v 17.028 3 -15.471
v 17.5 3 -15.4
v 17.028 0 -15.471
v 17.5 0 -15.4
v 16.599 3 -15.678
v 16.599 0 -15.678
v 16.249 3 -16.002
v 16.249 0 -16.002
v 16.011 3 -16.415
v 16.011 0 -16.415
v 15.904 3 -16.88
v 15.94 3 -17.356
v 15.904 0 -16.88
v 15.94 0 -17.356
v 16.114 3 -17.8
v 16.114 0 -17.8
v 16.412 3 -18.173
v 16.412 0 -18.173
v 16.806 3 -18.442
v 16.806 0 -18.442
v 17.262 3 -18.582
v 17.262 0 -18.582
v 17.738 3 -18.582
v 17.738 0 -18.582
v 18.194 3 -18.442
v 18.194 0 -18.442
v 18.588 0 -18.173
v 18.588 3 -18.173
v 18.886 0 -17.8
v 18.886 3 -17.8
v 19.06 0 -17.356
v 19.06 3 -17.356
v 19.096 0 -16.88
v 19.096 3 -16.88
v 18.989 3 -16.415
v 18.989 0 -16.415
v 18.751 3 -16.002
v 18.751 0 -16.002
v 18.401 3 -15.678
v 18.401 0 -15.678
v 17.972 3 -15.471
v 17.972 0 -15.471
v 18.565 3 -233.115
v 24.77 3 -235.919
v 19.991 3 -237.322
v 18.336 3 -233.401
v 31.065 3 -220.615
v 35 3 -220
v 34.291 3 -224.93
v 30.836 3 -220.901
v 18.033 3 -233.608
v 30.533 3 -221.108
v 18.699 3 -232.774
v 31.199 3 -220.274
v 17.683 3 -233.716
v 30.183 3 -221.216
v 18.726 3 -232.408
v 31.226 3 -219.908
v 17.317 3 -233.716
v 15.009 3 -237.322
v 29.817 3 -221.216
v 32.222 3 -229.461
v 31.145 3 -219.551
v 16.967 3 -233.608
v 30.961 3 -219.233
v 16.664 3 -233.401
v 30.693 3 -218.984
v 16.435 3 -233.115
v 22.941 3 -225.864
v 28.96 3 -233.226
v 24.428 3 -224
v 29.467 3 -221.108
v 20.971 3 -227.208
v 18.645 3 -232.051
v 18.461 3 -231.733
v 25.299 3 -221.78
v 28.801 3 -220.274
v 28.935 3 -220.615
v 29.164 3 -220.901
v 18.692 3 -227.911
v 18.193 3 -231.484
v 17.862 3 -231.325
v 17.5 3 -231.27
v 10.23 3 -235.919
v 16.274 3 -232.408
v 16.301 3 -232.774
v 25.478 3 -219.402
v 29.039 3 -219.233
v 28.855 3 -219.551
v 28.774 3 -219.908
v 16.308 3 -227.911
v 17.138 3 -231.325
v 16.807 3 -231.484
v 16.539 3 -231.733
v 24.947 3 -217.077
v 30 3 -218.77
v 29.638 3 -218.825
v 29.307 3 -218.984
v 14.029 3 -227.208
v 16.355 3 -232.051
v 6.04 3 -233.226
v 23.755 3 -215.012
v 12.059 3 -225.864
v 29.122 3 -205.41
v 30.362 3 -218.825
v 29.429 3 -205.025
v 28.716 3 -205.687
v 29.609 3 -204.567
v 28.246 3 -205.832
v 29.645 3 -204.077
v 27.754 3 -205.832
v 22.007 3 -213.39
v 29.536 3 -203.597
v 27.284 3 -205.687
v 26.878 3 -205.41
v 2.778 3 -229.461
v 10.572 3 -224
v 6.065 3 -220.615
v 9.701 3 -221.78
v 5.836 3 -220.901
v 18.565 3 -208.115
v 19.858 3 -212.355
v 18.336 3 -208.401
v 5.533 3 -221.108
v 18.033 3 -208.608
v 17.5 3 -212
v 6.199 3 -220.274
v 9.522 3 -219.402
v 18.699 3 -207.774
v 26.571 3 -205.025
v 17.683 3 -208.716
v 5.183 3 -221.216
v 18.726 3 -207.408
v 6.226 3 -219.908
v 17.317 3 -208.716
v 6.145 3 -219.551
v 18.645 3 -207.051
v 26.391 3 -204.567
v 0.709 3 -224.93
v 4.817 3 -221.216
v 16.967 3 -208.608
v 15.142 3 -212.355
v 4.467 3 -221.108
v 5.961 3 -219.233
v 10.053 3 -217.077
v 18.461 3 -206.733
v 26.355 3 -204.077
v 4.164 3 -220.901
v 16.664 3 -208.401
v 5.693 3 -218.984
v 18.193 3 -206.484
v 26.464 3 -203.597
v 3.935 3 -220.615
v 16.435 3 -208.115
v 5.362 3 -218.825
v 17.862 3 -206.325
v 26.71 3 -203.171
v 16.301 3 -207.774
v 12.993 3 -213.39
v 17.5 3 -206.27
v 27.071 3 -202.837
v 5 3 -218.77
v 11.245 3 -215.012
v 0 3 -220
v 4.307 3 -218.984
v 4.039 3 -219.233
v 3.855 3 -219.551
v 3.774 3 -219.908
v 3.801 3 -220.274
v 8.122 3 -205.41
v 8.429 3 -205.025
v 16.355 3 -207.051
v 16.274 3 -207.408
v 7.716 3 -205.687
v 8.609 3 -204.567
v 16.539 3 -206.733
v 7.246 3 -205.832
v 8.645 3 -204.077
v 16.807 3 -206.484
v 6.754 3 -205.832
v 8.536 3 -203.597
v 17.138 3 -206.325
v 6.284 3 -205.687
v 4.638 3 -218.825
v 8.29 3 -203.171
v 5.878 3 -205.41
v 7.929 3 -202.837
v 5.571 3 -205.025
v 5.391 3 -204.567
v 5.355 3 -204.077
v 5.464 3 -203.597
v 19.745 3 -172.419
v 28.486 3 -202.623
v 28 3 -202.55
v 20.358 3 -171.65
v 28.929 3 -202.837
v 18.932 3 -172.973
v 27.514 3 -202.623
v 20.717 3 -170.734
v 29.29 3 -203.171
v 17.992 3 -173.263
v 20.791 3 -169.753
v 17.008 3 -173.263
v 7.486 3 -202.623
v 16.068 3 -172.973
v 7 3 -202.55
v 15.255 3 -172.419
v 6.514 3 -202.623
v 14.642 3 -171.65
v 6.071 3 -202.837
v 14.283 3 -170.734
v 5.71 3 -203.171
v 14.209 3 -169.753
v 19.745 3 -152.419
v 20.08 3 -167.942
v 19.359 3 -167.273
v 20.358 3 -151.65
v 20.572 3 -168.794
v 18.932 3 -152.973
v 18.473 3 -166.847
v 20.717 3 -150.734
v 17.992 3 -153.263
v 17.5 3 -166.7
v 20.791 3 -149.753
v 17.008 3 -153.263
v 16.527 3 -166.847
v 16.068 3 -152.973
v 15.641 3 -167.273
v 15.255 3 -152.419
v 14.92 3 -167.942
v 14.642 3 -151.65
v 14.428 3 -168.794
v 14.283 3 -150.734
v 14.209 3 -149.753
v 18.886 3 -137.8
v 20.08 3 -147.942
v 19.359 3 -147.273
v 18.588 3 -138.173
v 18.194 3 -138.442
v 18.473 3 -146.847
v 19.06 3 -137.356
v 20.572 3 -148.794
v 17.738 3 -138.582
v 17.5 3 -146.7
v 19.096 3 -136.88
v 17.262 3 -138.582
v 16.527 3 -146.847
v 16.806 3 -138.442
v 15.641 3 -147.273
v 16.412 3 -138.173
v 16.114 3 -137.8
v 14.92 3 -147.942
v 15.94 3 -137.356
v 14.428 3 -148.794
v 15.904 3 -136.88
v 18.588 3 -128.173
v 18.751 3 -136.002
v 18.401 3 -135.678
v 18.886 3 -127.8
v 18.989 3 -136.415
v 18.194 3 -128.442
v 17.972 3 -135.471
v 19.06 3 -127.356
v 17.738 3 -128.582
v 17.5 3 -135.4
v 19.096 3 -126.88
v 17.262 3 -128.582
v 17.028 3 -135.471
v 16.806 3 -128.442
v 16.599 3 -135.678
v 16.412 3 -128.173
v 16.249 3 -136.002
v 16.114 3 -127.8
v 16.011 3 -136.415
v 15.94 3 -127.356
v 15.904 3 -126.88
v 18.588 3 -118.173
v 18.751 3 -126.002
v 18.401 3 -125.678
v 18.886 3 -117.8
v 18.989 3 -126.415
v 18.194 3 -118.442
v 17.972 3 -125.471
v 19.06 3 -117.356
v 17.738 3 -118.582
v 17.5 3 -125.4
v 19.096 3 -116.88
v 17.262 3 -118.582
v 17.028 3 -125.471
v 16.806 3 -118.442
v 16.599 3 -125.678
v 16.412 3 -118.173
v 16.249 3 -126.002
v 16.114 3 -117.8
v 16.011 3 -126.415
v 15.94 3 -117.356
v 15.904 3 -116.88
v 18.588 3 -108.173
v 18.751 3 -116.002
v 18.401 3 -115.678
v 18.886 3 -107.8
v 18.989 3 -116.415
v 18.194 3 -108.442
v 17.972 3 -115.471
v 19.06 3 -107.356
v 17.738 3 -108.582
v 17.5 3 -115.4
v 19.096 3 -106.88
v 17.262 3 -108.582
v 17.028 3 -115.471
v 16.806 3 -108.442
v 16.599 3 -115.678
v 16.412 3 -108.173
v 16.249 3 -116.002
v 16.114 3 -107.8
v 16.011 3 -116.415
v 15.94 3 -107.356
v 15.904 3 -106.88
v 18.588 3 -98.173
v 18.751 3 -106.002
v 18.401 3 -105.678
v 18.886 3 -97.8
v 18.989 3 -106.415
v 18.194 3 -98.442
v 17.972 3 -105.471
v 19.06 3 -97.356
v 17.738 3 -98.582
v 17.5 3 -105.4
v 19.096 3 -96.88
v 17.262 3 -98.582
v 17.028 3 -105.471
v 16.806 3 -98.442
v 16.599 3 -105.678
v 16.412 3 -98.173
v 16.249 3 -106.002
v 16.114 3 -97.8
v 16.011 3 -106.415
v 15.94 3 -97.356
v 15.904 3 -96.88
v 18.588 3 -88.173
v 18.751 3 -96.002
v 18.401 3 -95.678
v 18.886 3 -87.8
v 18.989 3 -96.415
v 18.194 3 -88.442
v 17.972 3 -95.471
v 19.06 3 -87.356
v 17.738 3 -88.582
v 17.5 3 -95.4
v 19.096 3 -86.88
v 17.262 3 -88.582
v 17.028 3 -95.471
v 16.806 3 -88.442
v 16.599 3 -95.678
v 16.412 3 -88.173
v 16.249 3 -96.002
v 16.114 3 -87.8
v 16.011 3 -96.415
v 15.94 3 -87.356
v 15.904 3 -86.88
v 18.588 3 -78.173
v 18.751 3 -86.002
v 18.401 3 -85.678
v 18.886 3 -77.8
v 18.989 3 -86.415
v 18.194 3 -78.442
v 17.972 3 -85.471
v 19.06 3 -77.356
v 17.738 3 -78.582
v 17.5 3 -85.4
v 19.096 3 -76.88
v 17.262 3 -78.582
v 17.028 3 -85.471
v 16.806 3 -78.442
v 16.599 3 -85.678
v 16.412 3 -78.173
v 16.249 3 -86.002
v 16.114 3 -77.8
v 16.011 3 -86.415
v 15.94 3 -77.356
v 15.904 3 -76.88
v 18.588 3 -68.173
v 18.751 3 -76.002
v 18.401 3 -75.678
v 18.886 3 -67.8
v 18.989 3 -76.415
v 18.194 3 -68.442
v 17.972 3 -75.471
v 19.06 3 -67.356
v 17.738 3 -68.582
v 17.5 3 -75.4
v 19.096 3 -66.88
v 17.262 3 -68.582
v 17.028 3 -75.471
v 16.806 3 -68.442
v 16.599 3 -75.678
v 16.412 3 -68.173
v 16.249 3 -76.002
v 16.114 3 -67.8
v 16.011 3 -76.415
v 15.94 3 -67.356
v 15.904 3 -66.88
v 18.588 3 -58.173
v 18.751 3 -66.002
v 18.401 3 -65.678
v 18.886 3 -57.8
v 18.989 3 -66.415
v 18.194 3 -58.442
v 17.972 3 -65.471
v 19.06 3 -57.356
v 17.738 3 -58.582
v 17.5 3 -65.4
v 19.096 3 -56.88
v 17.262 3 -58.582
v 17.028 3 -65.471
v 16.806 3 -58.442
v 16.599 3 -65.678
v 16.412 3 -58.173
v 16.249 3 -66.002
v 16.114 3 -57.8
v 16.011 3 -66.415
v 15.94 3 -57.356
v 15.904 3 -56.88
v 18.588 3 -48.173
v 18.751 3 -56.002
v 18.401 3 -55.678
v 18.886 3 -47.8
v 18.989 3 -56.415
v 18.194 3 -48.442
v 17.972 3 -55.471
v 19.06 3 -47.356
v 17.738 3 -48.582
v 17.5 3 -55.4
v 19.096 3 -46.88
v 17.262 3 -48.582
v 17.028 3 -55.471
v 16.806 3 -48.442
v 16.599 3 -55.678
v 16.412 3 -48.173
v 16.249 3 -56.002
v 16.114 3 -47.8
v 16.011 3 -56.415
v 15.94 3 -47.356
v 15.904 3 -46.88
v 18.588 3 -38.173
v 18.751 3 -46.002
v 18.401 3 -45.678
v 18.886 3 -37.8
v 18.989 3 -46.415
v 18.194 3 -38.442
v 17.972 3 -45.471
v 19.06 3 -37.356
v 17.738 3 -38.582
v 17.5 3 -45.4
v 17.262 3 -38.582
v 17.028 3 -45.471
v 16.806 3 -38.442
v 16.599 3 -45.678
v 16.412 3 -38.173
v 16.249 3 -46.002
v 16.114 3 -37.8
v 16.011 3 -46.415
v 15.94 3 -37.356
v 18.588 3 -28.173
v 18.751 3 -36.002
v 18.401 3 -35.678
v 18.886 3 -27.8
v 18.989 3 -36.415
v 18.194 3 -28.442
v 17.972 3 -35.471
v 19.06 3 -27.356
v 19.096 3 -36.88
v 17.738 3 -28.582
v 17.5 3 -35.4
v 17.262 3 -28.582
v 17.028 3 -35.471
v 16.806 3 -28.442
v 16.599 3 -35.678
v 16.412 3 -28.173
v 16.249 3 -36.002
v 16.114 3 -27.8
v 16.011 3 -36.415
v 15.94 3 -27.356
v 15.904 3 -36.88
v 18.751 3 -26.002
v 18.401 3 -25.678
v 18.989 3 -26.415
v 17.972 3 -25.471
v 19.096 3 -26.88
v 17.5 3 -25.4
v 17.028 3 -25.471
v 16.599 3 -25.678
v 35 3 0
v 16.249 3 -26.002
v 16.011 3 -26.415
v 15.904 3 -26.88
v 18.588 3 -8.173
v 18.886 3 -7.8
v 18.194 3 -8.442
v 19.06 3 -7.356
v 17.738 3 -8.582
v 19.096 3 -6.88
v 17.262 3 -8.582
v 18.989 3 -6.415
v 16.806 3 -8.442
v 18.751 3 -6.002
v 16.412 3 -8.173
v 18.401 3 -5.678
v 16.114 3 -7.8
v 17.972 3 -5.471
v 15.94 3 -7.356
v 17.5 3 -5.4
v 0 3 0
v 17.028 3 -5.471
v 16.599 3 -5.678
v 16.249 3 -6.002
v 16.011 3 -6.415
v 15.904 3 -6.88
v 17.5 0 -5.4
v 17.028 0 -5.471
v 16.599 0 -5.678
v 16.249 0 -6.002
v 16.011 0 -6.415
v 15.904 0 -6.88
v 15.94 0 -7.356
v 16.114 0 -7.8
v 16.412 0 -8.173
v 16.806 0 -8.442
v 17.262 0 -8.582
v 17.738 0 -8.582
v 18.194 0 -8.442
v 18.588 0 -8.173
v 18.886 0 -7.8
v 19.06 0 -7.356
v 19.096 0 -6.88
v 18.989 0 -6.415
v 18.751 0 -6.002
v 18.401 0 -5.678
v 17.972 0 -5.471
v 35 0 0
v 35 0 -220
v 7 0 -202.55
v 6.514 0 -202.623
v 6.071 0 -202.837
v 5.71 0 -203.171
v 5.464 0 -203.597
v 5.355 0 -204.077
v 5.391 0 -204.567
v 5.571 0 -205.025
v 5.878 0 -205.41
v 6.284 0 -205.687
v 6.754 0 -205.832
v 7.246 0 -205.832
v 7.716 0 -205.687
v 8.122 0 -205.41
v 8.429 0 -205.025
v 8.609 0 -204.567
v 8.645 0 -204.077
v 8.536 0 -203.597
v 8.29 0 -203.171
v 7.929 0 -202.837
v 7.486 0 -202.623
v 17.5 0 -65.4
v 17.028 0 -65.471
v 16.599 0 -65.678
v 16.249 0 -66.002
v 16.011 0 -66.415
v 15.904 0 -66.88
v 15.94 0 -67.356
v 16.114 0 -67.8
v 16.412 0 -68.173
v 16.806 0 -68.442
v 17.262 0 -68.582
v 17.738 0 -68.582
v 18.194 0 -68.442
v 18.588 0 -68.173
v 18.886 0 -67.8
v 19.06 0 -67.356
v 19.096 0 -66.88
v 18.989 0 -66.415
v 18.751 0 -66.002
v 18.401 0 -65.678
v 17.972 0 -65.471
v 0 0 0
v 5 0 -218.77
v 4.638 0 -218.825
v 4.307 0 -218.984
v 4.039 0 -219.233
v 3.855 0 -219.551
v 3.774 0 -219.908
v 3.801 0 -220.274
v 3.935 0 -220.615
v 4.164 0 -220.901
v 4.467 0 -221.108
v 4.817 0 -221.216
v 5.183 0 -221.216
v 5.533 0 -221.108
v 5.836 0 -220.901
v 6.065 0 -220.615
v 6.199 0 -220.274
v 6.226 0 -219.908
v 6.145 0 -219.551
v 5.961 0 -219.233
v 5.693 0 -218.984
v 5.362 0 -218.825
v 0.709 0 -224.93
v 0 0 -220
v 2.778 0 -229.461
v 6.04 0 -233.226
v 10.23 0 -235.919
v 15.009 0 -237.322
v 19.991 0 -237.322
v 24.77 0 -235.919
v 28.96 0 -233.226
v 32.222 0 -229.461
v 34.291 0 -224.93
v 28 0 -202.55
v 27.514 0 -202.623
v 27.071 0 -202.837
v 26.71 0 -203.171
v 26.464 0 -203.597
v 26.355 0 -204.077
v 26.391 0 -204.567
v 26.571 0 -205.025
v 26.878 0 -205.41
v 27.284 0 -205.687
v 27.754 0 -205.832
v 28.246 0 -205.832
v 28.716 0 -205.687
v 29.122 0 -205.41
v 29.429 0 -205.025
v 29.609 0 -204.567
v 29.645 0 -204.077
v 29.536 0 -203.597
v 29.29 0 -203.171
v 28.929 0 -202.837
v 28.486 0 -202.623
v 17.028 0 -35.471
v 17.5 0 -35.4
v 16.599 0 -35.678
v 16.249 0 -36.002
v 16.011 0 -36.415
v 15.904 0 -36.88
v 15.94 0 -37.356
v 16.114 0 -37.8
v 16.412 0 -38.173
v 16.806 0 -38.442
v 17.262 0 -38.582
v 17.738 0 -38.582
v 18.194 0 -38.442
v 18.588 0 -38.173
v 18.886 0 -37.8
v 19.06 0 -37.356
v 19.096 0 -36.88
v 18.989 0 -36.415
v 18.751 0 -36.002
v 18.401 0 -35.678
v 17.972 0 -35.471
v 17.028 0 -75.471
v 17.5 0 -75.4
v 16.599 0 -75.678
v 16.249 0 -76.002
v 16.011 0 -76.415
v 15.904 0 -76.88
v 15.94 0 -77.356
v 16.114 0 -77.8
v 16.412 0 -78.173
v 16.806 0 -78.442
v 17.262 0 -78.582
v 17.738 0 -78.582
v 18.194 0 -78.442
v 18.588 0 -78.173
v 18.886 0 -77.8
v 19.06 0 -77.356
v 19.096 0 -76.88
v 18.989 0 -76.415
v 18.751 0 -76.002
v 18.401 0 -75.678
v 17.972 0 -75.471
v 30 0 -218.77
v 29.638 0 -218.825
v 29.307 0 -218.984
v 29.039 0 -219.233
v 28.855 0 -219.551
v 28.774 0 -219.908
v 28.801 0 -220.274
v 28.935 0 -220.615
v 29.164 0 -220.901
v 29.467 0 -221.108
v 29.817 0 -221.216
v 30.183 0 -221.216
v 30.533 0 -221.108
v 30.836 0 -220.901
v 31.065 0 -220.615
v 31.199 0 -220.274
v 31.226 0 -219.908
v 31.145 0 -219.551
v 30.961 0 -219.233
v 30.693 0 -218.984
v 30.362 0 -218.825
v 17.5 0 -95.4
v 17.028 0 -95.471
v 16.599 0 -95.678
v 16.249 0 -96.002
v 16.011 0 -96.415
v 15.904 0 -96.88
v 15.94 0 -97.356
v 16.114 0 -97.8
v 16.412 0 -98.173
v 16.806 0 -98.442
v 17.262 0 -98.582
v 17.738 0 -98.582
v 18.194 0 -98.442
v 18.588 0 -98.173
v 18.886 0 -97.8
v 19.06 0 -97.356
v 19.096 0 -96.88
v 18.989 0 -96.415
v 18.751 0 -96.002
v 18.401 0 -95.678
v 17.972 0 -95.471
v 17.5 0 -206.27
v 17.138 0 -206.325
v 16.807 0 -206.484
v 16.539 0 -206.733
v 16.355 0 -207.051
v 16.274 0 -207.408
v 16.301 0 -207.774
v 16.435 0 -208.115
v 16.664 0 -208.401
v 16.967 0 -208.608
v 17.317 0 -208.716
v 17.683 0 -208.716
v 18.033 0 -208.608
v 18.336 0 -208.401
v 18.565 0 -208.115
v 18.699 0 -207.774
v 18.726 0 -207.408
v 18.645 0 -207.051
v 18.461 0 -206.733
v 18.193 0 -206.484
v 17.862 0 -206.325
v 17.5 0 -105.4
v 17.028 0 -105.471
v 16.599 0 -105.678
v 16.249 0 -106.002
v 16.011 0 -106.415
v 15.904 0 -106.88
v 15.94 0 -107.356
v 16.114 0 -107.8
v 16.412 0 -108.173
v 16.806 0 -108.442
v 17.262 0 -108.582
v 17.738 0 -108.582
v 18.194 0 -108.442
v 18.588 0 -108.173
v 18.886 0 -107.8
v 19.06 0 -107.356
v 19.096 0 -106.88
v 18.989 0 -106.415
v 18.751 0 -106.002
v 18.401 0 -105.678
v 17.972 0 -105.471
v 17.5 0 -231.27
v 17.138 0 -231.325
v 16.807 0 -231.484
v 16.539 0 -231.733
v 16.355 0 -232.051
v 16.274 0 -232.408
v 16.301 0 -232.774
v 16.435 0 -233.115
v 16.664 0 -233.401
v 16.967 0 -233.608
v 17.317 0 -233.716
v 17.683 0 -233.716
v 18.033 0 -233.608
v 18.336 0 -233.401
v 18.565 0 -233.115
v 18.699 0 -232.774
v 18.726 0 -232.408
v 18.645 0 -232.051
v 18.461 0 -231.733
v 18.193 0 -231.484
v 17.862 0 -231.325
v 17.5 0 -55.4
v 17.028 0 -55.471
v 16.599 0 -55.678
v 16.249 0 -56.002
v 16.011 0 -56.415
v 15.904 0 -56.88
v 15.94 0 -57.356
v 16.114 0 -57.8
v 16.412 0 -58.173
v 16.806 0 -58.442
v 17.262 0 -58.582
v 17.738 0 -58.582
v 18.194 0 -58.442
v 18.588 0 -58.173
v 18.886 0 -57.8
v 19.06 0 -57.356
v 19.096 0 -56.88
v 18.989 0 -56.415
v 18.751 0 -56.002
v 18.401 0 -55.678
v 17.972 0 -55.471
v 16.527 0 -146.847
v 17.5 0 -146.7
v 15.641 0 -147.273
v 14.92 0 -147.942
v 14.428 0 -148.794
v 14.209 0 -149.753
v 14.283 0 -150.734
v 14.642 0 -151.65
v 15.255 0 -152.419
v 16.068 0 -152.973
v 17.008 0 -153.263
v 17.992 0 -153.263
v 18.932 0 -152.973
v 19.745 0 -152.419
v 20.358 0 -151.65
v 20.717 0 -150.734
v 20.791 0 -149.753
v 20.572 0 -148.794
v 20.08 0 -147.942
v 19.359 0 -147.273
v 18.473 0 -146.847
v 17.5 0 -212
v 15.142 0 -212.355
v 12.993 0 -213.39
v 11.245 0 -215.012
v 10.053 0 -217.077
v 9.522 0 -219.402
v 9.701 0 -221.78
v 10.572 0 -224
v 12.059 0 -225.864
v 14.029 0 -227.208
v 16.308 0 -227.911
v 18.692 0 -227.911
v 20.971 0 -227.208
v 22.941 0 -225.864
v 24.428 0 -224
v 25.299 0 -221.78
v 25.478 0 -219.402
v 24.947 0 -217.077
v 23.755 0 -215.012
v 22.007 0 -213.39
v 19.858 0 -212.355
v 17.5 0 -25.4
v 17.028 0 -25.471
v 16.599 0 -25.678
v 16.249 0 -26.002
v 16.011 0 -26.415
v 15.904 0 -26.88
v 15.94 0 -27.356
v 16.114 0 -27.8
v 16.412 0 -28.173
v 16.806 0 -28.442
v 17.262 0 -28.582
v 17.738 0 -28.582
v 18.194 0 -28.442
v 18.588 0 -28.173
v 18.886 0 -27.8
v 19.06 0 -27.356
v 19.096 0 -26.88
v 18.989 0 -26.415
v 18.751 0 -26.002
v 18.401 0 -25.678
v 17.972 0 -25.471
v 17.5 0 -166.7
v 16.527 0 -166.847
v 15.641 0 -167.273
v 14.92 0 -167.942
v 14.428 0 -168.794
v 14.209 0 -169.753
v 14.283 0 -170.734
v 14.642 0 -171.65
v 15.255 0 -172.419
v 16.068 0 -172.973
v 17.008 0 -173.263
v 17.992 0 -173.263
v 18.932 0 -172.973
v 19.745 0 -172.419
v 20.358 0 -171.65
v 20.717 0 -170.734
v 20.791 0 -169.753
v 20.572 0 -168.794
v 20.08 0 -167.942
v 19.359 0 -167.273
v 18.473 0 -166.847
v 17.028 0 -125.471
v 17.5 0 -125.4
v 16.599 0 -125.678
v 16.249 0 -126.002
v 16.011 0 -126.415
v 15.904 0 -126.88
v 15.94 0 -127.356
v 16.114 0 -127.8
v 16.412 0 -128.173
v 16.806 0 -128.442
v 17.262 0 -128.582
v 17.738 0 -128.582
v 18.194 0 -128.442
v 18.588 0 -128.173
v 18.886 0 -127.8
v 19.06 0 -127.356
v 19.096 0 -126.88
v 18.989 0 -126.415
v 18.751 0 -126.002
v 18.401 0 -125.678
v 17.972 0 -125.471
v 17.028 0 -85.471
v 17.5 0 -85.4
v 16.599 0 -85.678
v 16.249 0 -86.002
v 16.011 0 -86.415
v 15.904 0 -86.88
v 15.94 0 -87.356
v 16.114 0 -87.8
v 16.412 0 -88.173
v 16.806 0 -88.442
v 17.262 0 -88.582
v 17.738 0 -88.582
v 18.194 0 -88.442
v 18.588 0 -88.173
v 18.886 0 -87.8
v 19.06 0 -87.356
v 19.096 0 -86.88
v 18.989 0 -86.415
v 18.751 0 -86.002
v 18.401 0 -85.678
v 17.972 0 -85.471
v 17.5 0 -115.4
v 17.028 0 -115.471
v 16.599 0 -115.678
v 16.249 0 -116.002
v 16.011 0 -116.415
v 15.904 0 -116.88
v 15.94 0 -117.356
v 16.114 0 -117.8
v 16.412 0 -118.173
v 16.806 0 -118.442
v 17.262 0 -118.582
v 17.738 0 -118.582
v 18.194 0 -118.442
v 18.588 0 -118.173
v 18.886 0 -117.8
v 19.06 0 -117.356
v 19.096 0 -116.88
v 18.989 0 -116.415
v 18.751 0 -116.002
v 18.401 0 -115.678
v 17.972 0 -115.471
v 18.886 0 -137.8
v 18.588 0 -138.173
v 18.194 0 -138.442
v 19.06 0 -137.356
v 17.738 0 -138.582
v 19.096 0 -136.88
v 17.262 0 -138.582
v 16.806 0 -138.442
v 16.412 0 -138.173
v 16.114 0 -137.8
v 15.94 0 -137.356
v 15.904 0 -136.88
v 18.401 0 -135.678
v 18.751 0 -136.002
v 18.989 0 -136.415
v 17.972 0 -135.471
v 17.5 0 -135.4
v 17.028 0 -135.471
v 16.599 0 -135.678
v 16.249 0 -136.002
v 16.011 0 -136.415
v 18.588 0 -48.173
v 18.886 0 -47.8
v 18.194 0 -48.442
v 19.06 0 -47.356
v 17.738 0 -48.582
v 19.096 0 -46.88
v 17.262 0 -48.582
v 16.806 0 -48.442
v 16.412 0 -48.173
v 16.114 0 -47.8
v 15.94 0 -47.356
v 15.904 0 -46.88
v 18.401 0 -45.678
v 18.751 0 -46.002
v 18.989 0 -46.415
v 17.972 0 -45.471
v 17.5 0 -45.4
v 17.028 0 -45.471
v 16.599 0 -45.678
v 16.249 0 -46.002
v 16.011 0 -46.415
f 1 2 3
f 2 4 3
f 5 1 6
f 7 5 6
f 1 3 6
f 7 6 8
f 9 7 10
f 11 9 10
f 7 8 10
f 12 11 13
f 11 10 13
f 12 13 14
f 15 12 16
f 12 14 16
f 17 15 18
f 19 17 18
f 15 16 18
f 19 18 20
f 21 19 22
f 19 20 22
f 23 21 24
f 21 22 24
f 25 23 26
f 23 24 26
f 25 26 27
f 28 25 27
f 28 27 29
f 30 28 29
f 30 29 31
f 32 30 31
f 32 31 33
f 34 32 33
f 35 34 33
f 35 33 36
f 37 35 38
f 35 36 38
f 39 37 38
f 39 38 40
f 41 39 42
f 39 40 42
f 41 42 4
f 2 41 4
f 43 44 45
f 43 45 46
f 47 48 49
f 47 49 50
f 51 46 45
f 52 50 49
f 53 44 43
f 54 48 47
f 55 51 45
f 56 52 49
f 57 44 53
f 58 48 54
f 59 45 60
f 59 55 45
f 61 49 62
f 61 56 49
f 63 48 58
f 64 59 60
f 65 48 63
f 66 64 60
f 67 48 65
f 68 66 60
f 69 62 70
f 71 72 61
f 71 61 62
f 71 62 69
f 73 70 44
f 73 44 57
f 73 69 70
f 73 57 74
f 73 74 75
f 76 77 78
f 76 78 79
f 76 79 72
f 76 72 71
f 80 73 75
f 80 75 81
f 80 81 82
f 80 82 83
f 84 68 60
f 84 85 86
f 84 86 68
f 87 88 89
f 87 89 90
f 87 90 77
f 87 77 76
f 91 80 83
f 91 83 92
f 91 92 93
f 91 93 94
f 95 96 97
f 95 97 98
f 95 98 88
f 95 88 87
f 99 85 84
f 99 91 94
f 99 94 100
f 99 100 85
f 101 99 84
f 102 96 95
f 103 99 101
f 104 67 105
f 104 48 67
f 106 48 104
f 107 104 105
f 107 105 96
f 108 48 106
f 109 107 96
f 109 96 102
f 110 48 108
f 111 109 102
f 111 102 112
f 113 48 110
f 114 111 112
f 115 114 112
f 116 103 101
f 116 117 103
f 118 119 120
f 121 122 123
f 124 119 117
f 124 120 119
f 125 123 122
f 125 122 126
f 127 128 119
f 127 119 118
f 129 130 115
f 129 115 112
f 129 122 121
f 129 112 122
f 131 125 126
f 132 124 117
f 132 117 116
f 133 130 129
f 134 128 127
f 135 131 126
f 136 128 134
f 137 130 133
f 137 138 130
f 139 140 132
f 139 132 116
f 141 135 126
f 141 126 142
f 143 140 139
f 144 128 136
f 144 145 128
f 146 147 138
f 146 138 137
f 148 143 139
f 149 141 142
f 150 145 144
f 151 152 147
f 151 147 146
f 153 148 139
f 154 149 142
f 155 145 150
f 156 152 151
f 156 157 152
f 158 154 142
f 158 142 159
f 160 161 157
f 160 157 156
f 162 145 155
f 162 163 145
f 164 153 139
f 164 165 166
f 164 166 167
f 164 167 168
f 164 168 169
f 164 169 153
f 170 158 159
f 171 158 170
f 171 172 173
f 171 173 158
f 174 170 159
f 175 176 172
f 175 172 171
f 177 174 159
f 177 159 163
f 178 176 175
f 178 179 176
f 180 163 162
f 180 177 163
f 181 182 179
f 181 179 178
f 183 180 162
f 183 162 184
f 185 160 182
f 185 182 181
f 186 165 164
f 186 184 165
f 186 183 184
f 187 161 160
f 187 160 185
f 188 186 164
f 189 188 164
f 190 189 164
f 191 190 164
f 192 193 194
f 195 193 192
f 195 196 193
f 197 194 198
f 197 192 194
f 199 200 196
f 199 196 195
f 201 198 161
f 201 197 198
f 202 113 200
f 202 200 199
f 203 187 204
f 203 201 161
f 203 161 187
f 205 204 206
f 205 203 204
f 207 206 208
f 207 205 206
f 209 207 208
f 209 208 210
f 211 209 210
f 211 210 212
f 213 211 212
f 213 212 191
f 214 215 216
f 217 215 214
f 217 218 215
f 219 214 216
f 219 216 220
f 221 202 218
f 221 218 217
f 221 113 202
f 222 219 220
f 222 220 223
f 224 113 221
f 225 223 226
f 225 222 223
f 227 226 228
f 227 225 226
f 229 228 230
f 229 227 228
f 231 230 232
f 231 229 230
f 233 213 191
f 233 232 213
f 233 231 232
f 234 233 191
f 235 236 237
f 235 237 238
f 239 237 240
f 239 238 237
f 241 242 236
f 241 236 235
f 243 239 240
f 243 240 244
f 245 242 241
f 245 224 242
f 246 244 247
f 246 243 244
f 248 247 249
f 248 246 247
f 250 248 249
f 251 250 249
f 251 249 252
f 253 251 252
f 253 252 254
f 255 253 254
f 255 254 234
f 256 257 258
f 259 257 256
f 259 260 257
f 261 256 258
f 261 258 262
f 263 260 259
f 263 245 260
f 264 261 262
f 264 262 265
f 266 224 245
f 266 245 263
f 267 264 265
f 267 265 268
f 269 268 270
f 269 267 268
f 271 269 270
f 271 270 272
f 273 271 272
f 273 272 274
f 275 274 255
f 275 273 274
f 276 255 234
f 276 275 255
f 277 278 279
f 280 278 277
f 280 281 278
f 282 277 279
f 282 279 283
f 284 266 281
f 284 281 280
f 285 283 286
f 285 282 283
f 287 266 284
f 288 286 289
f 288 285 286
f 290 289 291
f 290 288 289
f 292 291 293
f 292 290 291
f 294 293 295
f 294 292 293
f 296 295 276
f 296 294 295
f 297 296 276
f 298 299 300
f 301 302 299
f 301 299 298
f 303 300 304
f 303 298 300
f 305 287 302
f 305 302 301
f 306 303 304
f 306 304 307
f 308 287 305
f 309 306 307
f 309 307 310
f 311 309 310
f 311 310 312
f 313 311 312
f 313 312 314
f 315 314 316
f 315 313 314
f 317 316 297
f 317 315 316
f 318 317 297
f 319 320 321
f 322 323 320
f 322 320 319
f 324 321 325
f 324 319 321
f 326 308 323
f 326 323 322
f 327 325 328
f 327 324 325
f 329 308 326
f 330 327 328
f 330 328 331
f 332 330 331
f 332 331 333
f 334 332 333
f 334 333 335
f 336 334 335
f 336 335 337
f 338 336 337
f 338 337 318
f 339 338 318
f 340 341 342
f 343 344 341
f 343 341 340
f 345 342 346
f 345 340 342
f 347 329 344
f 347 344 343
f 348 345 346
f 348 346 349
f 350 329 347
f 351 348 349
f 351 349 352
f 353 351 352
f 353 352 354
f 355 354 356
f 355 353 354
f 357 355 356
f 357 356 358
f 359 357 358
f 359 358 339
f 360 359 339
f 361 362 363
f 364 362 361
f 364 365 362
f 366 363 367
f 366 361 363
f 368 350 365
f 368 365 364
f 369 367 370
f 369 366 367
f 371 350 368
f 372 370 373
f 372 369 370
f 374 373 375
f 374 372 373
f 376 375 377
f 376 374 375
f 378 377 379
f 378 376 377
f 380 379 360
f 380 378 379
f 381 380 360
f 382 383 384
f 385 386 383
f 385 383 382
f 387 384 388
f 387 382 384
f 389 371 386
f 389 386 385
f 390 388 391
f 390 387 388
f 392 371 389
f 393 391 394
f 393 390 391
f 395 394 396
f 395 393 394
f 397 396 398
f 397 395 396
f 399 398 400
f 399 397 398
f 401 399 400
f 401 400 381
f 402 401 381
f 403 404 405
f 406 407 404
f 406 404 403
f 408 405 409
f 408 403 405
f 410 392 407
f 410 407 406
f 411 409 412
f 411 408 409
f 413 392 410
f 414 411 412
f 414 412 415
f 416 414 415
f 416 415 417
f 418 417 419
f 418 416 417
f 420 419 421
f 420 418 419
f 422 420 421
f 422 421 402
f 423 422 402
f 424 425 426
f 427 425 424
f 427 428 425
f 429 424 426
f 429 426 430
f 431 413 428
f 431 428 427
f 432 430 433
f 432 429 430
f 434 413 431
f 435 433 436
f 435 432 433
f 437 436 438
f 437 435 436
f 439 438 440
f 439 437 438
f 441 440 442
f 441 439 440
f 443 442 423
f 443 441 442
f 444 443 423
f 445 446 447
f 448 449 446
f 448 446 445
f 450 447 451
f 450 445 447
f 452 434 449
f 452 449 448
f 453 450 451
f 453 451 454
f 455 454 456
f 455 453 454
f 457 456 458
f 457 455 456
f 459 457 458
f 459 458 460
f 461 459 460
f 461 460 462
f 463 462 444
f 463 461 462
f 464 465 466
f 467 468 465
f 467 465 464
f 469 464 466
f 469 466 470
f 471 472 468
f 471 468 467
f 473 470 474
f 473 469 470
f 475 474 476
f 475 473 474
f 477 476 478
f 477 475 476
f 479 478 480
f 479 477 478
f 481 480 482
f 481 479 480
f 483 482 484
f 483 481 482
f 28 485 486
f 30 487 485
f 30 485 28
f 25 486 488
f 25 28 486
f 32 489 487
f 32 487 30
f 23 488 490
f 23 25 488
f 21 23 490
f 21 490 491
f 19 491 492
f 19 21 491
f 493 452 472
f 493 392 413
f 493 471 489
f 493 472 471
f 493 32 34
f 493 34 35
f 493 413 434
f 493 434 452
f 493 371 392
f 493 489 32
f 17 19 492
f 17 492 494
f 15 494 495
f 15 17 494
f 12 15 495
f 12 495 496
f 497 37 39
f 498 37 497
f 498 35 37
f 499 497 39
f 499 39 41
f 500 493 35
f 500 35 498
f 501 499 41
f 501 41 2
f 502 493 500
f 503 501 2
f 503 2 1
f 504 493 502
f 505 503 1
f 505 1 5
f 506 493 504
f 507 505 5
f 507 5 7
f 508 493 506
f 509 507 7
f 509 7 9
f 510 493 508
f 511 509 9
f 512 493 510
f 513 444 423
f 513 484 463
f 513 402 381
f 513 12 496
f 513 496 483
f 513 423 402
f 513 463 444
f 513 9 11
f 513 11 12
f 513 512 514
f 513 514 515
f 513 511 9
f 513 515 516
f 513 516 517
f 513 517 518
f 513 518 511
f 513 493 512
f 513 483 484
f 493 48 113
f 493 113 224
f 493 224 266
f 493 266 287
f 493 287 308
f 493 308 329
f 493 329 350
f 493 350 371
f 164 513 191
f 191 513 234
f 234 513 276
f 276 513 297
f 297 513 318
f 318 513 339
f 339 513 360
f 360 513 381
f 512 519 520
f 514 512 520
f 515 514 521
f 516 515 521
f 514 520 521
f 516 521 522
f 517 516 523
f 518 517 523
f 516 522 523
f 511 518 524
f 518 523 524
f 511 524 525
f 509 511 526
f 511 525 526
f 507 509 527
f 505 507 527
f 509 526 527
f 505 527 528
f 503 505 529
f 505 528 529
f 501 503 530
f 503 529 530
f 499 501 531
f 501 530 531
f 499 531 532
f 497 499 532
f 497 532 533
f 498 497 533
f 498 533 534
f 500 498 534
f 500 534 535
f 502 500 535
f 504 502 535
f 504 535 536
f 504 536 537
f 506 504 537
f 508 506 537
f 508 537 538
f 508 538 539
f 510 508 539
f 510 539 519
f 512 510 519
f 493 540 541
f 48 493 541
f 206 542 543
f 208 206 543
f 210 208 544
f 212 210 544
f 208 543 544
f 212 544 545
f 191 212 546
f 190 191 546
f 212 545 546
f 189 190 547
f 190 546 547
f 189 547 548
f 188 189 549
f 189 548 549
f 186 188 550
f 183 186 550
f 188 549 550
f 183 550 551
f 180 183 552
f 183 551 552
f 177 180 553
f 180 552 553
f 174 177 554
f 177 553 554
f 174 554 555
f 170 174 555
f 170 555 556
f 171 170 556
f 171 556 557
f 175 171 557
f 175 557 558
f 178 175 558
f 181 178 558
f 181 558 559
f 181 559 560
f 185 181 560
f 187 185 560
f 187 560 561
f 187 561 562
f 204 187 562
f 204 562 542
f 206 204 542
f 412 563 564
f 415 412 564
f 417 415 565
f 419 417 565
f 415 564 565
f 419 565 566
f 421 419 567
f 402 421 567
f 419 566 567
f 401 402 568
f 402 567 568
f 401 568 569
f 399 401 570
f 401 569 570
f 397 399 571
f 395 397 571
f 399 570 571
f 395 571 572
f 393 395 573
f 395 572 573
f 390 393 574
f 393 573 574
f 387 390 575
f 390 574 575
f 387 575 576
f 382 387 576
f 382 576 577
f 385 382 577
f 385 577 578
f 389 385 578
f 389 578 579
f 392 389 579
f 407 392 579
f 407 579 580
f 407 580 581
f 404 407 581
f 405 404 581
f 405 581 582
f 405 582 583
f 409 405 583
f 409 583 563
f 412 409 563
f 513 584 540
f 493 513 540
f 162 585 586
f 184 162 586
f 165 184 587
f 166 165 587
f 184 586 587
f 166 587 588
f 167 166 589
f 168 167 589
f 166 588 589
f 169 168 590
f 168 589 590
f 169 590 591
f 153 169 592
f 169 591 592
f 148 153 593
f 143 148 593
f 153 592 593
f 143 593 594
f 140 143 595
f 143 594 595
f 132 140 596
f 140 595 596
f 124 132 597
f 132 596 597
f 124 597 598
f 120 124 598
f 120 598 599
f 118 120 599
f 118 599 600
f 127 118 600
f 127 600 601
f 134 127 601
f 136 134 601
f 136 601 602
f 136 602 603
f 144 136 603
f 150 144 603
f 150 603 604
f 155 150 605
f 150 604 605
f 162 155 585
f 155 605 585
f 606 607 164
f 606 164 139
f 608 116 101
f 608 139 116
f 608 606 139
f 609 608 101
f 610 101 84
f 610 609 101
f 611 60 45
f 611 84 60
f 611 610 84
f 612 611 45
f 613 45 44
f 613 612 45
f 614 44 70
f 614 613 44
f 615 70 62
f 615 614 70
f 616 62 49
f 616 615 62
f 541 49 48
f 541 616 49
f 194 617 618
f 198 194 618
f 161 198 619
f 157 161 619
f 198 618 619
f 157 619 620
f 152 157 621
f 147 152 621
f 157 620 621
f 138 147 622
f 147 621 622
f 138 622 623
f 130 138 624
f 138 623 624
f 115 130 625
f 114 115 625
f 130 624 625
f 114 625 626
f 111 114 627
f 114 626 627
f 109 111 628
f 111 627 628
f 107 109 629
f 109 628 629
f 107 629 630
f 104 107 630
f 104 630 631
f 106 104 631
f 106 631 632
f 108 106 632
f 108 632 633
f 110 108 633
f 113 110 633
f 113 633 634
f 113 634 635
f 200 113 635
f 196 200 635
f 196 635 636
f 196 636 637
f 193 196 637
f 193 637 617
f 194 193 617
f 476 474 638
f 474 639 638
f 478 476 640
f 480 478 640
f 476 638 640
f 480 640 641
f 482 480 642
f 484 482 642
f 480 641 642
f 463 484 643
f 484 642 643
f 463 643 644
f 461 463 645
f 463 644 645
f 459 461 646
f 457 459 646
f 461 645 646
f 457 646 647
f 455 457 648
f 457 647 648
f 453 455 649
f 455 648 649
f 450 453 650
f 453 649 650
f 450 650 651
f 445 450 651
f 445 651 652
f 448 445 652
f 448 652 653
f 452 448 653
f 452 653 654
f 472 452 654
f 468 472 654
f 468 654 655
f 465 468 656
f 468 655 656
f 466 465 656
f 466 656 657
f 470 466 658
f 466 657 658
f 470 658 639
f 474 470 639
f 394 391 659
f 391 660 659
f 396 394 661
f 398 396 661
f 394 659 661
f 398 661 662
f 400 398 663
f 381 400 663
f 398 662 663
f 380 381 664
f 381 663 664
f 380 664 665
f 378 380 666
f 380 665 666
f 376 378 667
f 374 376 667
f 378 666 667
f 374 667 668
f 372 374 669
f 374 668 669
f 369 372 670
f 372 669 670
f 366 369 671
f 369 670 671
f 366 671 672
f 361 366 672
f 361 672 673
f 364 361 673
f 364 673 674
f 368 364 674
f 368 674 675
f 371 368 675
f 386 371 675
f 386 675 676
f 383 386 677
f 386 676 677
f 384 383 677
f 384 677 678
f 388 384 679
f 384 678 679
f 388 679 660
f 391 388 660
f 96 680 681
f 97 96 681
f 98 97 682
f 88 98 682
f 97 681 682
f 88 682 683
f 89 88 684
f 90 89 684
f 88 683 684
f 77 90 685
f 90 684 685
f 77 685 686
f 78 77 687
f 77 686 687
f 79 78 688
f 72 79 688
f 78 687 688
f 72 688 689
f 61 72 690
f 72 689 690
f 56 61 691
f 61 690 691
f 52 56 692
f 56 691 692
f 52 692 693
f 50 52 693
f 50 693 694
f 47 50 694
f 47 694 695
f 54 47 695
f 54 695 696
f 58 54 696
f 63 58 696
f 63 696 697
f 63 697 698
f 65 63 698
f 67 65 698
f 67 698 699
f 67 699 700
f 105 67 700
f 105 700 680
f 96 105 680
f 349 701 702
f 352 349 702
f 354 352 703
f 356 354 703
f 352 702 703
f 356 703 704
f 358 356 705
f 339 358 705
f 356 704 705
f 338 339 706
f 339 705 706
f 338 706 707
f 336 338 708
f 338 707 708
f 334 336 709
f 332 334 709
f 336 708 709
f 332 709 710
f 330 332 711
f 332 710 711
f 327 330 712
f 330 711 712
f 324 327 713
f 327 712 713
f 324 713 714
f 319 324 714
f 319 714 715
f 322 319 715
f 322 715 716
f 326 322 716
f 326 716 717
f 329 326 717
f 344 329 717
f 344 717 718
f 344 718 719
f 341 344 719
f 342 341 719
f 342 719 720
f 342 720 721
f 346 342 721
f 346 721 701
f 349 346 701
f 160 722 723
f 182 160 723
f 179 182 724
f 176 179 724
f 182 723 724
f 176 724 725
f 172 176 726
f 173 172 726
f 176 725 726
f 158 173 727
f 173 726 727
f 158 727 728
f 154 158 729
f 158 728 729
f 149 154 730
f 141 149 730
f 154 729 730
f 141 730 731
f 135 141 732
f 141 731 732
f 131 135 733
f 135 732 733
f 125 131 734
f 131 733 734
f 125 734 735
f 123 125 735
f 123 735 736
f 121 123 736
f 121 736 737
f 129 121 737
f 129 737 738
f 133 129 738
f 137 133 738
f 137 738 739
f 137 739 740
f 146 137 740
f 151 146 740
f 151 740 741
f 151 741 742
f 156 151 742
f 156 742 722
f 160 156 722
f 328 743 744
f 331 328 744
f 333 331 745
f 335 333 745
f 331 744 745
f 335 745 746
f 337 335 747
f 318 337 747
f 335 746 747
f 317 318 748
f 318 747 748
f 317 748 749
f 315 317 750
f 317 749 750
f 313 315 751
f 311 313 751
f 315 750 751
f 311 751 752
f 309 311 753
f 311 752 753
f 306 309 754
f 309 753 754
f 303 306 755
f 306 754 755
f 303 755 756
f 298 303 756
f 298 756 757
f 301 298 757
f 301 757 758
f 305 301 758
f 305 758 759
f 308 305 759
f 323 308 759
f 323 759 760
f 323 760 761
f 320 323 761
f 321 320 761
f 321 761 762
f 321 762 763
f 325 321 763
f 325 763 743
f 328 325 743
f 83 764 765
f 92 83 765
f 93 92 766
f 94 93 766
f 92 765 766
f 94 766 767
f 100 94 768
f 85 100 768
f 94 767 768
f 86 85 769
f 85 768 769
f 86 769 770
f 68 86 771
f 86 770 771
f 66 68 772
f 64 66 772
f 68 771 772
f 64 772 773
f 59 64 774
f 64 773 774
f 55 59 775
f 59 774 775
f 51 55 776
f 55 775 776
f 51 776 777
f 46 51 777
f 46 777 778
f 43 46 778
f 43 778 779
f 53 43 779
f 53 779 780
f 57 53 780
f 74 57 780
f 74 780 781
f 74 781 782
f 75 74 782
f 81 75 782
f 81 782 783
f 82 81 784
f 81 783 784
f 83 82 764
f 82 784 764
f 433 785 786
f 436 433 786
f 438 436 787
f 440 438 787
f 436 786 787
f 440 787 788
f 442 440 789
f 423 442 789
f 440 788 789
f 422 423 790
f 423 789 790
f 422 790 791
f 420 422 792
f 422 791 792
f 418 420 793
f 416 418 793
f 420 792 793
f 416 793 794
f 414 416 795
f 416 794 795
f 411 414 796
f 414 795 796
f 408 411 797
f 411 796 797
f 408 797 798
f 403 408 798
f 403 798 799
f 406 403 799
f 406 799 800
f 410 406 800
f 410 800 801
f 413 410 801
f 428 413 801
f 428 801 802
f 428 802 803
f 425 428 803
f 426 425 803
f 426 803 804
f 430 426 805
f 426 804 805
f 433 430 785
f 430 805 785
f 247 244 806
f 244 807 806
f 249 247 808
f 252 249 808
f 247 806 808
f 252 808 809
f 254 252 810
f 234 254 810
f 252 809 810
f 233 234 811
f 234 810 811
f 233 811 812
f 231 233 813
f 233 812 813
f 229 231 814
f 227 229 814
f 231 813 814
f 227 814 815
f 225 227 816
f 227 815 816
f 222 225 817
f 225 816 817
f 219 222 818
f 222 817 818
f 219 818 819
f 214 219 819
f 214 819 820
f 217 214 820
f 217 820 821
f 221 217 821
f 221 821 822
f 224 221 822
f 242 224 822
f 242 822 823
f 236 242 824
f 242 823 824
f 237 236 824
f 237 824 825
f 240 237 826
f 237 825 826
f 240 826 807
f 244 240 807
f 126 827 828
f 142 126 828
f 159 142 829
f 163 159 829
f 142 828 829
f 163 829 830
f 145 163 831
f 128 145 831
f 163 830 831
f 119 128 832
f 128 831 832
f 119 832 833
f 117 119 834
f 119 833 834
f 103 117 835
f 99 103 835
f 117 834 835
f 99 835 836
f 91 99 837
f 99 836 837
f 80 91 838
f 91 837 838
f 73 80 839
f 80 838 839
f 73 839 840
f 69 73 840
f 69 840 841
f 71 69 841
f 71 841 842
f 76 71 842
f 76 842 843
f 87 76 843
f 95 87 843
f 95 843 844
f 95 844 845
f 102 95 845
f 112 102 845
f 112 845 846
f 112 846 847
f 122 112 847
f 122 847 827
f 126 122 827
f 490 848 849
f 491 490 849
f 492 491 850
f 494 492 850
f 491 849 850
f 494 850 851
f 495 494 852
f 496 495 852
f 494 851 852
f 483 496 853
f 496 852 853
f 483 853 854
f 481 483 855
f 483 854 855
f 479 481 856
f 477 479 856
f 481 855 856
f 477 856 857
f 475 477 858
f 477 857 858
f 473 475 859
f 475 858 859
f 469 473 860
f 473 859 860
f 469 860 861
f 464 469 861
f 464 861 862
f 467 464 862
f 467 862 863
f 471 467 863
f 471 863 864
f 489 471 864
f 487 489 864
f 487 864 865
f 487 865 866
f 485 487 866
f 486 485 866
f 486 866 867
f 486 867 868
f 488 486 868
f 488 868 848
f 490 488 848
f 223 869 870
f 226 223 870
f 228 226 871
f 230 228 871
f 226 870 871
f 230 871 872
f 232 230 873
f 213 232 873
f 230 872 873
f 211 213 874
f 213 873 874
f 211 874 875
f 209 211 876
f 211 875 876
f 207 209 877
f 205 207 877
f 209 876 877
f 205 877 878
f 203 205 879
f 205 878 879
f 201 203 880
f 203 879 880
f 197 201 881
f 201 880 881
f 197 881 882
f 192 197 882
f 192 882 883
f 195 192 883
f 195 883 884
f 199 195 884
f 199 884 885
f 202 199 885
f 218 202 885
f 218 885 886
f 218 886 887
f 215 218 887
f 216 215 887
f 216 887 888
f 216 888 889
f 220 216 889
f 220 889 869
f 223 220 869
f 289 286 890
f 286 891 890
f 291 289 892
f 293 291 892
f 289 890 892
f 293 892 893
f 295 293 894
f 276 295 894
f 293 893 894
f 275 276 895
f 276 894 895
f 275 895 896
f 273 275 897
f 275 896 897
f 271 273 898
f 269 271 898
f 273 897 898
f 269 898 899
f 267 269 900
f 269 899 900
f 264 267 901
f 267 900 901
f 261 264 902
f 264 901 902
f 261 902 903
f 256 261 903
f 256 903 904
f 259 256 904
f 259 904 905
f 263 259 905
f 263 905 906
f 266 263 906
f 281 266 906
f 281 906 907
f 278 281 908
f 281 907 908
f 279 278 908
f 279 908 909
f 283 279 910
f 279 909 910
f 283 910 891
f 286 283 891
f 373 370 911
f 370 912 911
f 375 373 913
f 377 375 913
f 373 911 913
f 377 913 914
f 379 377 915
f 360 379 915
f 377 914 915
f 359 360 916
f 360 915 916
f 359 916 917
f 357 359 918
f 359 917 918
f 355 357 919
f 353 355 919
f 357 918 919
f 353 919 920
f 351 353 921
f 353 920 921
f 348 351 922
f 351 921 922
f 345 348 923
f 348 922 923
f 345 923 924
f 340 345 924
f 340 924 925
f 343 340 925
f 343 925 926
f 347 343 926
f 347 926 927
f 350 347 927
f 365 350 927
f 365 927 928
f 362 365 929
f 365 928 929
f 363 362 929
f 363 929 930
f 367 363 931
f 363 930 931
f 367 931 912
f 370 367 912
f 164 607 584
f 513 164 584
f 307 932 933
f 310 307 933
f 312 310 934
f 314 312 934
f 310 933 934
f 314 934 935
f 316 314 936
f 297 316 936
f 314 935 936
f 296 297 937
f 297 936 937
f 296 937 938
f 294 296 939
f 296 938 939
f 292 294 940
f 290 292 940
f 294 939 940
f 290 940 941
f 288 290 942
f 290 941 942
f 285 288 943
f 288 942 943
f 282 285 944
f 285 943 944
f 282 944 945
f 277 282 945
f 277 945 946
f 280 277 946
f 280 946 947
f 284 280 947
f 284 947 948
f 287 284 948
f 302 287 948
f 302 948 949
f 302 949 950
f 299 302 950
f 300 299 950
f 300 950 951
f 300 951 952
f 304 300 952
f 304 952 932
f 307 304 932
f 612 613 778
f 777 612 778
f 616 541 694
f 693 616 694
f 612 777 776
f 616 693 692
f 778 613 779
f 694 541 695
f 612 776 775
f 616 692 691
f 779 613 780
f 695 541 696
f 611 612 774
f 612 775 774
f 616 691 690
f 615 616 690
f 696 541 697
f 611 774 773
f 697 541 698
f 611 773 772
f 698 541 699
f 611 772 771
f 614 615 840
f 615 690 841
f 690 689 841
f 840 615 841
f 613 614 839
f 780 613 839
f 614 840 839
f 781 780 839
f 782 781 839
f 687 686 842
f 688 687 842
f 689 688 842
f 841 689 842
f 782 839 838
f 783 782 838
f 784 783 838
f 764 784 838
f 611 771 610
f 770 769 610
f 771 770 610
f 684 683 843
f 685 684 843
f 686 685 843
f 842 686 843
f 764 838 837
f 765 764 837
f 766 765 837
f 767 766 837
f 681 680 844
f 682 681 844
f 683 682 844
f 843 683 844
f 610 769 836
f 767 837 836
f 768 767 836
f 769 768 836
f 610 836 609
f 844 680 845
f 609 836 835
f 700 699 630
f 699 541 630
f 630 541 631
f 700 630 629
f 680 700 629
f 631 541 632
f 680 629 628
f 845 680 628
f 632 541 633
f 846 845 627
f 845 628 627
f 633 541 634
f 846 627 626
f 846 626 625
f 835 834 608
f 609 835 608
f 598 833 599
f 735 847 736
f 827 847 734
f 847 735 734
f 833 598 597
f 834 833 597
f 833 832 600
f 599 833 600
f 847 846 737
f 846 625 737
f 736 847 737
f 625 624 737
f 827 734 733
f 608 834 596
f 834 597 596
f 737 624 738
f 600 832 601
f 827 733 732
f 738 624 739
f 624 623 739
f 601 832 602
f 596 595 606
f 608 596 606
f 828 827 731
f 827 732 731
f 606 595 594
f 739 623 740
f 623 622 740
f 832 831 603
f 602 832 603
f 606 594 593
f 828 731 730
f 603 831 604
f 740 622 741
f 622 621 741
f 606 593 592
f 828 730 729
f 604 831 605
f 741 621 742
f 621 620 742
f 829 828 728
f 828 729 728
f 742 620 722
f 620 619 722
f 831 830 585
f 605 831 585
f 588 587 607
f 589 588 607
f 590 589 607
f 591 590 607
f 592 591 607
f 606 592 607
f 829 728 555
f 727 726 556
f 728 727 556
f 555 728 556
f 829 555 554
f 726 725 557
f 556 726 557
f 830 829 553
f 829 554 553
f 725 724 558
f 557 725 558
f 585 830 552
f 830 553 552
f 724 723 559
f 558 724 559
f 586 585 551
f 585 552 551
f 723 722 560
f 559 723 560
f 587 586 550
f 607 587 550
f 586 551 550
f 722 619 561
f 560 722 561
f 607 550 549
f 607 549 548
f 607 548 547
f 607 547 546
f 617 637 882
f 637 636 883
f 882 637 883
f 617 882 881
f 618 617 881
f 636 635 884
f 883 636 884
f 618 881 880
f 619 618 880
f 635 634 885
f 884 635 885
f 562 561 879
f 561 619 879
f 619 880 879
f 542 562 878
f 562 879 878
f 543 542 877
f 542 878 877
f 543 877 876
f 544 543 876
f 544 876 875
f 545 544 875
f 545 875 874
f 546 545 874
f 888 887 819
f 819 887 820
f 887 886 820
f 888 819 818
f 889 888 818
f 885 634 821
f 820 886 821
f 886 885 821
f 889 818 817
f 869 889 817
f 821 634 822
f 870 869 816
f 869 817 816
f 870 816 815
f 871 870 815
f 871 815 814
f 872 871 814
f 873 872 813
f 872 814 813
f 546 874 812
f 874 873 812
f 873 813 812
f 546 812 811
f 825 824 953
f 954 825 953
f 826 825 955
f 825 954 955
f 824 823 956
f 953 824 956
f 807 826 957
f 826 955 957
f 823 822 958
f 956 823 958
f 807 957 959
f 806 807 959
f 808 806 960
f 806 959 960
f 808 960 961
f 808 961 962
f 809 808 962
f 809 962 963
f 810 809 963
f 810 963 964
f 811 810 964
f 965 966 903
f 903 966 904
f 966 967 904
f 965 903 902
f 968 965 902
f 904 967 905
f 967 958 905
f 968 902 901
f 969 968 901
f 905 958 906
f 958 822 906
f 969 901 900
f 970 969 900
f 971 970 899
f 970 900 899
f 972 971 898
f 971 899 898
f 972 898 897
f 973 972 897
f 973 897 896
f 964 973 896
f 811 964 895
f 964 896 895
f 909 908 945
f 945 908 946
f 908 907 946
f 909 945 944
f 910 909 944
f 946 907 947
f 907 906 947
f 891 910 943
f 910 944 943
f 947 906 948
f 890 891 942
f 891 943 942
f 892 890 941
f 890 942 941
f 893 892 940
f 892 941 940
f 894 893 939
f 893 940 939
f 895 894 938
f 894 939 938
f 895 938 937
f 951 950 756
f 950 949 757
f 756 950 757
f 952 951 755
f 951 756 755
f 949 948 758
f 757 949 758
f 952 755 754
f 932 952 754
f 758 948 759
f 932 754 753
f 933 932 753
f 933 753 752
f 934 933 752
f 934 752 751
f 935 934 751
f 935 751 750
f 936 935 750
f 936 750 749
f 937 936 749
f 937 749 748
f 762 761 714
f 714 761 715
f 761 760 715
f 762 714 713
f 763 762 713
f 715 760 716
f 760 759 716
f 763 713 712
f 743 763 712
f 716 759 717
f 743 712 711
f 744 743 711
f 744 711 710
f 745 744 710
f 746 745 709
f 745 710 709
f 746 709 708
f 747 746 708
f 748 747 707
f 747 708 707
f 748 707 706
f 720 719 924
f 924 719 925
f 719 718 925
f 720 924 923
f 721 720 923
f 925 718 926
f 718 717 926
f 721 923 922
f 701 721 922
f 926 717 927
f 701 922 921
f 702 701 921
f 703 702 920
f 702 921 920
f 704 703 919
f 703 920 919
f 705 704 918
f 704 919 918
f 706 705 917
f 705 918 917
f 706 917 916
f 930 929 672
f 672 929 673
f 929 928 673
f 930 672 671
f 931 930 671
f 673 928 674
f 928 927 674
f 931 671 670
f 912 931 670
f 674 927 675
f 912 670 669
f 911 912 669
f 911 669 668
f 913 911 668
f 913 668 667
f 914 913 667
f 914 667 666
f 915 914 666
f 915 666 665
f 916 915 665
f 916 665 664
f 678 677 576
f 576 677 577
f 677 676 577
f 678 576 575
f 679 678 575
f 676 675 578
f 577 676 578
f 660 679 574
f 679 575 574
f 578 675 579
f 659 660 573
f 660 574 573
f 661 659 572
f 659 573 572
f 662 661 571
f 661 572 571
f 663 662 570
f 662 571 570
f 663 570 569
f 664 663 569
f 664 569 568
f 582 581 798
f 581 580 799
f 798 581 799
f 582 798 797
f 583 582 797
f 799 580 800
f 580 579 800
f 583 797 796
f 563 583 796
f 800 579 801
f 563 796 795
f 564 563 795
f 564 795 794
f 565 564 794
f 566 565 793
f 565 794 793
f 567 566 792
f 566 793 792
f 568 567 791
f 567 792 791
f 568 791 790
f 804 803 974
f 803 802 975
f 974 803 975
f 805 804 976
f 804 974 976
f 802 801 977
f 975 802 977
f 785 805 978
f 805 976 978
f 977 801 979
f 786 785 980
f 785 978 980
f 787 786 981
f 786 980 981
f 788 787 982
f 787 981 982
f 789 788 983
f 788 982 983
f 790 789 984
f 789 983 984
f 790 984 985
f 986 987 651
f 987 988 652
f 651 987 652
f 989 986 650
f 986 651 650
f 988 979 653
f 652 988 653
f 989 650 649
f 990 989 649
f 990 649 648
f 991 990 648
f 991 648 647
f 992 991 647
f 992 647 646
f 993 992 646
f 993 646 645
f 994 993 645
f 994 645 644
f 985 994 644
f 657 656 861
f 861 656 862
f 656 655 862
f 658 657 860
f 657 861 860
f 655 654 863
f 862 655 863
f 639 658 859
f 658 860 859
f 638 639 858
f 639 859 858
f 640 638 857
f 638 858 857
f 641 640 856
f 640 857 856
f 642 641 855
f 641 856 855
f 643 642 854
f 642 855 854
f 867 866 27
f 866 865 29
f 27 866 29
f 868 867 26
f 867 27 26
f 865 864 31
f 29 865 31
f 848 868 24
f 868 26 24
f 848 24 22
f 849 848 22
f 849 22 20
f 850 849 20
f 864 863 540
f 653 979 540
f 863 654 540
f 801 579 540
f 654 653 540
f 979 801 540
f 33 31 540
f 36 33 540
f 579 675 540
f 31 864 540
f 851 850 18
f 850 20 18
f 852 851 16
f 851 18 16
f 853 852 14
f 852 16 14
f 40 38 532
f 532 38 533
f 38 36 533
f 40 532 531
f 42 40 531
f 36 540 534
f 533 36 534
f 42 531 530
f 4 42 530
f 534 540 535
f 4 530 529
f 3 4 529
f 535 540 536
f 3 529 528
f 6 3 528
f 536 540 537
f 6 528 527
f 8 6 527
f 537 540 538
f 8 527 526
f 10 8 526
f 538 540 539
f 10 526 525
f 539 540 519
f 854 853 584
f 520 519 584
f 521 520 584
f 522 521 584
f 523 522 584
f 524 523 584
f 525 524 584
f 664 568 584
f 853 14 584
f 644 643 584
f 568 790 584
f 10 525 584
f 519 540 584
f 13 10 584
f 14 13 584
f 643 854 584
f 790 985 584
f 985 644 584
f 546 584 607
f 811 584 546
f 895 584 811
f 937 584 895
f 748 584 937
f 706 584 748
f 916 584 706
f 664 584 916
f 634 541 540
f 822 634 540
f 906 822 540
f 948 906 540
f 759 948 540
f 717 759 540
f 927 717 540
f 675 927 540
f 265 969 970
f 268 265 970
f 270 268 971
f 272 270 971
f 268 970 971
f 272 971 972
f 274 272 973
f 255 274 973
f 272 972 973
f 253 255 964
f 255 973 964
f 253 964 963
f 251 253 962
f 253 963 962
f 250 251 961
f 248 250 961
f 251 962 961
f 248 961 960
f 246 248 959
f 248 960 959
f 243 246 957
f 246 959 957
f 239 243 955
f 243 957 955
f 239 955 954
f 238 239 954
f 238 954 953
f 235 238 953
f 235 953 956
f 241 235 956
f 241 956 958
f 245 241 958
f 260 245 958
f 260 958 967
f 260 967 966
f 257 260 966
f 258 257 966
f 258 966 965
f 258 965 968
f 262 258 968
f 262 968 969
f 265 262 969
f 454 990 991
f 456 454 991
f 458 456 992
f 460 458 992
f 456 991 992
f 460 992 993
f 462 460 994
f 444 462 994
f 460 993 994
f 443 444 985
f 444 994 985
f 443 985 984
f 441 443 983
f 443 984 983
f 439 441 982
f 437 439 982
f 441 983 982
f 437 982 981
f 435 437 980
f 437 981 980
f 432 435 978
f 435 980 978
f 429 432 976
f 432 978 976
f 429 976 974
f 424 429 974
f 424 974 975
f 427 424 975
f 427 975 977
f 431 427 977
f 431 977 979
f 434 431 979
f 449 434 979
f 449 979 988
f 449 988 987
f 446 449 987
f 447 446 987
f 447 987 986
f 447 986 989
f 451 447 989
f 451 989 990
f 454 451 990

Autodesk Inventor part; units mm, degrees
ref_plane "YZ Plane" through (0, 0, 0) normal (1, 0, 0) x (0, 1, 0)
ref_plane "XZ Plane" through (0, 0, 0) normal (0, 1, 0) x (-1, 0, 0)
ref_plane "XY Plane" through (0, 0, 0) normal (0, 0, 1) x (1, 0, 0)
sketch "スケッチ1" plane through (0, 0, 0) normal (0, 1, 0) x (-1, 0, 0)
  line L0 (0, 0) -> (-35, 0)
  line L1 (-35, 0) -> (-35, -220)
  line L2 (-35, -220) -> (0, -220)
  line L3 (0, -220) -> (0, 0)
  arc A0 (-35, -220) -> (0, -220) centre (-17.5, -220) ccw
  dimension "d0" = 35
  dimension "d1" = 220
  dimension "d2" = 17.5
extrude "押し出し1" add sketch "スケッチ1" along normal blind 3
sketch "スケッチ2" plane through (0, 3, 0) normal (0, 1, 0) x (1, 0, 0)
  line L0 (0, 0) -> (35, 0) construction
  line L1 (17.5, 0) -> (17.5, 237.5) construction
  arc A0 (35, 220) -> (0, 220) centre (17.5, 220) ccw construction
hole "穴1" at (17.5, 3, -220) direction (0, -1, 0) diameter 16 end through all
sketch "スケッチ3" plane through (0, 3, 0) normal (0, 1, 0) x (1, 0, 0)
  circle A0 centre (17.5, 220) radius 8 projected
  circle A1 centre (17.5, 220) radius 12.5
  point P0 (0, 0)
  point P1 (5, 220)
  point P2 (30, 220)
  point P3 (17.5, 232.5)
  point P4 (17.5, 207.5)
  dimension "d12" = 25
hole "穴2" at (5, 3, -220) at (30, 3, -220) at (17.5, 3, -232.5) at (17.5, 3, -207.5) direction (0, -1, 0) diameter 2.459 end through all thread size "M3x0.5" class "6H" standard "ISO Metric profile"
sketch "スケッチ4" plane through (0, 3, 0) normal (0, 1, 0) x (1, 0, 0)
  line L0 (0, 0) -> (35, 0) construction
  line L1 (17.5, 0) -> (17.5, 237.5) construction
  arc A0 (35, 220) -> (0, 220) centre (17.5, 220) ccw construction
  circle A1 centre (17.5, 220) radius 8 projected
  point P0 (17.5, 137)
  point P1 (17.5, 127)
  point P2 (17.5, 117)
  point P3 (17.5, 107)
  point P4 (17.5, 97)
  point P5 (17.5, 87)
  point P6 (17.5, 77)
  point P7 (17.5, 67)
  point P8 (17.5, 57)
  point P9 (17.5, 47)
  point P10 (17.5, 37)
  point P11 (17.5, 27)
  point P12 (17.5, 17)
  point P13 (17.5, 7)
  dimension "d42" = 83
  dimension "d45" = 10
hole "穴3" at (17.5, 3, -137) at (17.5, 3, -127) at (17.5, 3, -117) at (17.5, 3, -107) at (17.5, 3, -97) at (17.5, 3, -87) at (17.5, 3, -77) at (17.5, 3, -67) at (17.5, 3, -57) at (17.5, 3, -47) at (17.5, 3, -37) at (17.5, 3, -27) at (17.5, 3, -17) at (17.5, 3, -7) direction (0, -1, 0) diameter 3.2 end through all
sketch "スケッチ5" plane through (0, 3, 0) normal (0, 1, 0) x (1, 0, 0)
  line L0 (0, 0) -> (35, 0) construction
  line L1 (17.5, 0) -> (17.5, 237.5) construction
  arc A0 (35, 220) -> (0, 220) centre (17.5, 220) ccw construction
  circle A1 centre (17.5, 137) radius 1.6 construction
  point P0 (17.5, 150)
  point P1 (17.5, 170)
  dimension "d50" = 13
  dimension "d51" = 20
hole "穴4" at (17.5, 3, -150) at (17.5, 3, -170) direction (0, -1, 0) diameter 6.6 end through all
sketch "スケッチ6" plane through (0, 3, 0) normal (0, 1, 0) x (1, 0, 0)
  line L0 (35, 0) -> (35, 220) projected
  line L1 (35, 204.2) -> (0, 204.2) construction
  line L2 (0, 220) -> (0, 0) projected
  circle A0 centre (17.5, 220) radius 8 projected
  line L3 (17.5, 220) -> (17.5, 204.2) construction
  point P0 (28, 204.2)
  point P1 (7, 204.2)
  dimension "d52" = 15.8
  dimension "d53" = 10.5
  dimension "d54" = 10.5
hole "穴5" at (28, 3, -204.2) at (7, 3, -204.2) direction (0, -1, 0) diameter 3.3 end through all
properties part number "shoulder2_upper_plate_rigth" material "アルミニウム 5052"
